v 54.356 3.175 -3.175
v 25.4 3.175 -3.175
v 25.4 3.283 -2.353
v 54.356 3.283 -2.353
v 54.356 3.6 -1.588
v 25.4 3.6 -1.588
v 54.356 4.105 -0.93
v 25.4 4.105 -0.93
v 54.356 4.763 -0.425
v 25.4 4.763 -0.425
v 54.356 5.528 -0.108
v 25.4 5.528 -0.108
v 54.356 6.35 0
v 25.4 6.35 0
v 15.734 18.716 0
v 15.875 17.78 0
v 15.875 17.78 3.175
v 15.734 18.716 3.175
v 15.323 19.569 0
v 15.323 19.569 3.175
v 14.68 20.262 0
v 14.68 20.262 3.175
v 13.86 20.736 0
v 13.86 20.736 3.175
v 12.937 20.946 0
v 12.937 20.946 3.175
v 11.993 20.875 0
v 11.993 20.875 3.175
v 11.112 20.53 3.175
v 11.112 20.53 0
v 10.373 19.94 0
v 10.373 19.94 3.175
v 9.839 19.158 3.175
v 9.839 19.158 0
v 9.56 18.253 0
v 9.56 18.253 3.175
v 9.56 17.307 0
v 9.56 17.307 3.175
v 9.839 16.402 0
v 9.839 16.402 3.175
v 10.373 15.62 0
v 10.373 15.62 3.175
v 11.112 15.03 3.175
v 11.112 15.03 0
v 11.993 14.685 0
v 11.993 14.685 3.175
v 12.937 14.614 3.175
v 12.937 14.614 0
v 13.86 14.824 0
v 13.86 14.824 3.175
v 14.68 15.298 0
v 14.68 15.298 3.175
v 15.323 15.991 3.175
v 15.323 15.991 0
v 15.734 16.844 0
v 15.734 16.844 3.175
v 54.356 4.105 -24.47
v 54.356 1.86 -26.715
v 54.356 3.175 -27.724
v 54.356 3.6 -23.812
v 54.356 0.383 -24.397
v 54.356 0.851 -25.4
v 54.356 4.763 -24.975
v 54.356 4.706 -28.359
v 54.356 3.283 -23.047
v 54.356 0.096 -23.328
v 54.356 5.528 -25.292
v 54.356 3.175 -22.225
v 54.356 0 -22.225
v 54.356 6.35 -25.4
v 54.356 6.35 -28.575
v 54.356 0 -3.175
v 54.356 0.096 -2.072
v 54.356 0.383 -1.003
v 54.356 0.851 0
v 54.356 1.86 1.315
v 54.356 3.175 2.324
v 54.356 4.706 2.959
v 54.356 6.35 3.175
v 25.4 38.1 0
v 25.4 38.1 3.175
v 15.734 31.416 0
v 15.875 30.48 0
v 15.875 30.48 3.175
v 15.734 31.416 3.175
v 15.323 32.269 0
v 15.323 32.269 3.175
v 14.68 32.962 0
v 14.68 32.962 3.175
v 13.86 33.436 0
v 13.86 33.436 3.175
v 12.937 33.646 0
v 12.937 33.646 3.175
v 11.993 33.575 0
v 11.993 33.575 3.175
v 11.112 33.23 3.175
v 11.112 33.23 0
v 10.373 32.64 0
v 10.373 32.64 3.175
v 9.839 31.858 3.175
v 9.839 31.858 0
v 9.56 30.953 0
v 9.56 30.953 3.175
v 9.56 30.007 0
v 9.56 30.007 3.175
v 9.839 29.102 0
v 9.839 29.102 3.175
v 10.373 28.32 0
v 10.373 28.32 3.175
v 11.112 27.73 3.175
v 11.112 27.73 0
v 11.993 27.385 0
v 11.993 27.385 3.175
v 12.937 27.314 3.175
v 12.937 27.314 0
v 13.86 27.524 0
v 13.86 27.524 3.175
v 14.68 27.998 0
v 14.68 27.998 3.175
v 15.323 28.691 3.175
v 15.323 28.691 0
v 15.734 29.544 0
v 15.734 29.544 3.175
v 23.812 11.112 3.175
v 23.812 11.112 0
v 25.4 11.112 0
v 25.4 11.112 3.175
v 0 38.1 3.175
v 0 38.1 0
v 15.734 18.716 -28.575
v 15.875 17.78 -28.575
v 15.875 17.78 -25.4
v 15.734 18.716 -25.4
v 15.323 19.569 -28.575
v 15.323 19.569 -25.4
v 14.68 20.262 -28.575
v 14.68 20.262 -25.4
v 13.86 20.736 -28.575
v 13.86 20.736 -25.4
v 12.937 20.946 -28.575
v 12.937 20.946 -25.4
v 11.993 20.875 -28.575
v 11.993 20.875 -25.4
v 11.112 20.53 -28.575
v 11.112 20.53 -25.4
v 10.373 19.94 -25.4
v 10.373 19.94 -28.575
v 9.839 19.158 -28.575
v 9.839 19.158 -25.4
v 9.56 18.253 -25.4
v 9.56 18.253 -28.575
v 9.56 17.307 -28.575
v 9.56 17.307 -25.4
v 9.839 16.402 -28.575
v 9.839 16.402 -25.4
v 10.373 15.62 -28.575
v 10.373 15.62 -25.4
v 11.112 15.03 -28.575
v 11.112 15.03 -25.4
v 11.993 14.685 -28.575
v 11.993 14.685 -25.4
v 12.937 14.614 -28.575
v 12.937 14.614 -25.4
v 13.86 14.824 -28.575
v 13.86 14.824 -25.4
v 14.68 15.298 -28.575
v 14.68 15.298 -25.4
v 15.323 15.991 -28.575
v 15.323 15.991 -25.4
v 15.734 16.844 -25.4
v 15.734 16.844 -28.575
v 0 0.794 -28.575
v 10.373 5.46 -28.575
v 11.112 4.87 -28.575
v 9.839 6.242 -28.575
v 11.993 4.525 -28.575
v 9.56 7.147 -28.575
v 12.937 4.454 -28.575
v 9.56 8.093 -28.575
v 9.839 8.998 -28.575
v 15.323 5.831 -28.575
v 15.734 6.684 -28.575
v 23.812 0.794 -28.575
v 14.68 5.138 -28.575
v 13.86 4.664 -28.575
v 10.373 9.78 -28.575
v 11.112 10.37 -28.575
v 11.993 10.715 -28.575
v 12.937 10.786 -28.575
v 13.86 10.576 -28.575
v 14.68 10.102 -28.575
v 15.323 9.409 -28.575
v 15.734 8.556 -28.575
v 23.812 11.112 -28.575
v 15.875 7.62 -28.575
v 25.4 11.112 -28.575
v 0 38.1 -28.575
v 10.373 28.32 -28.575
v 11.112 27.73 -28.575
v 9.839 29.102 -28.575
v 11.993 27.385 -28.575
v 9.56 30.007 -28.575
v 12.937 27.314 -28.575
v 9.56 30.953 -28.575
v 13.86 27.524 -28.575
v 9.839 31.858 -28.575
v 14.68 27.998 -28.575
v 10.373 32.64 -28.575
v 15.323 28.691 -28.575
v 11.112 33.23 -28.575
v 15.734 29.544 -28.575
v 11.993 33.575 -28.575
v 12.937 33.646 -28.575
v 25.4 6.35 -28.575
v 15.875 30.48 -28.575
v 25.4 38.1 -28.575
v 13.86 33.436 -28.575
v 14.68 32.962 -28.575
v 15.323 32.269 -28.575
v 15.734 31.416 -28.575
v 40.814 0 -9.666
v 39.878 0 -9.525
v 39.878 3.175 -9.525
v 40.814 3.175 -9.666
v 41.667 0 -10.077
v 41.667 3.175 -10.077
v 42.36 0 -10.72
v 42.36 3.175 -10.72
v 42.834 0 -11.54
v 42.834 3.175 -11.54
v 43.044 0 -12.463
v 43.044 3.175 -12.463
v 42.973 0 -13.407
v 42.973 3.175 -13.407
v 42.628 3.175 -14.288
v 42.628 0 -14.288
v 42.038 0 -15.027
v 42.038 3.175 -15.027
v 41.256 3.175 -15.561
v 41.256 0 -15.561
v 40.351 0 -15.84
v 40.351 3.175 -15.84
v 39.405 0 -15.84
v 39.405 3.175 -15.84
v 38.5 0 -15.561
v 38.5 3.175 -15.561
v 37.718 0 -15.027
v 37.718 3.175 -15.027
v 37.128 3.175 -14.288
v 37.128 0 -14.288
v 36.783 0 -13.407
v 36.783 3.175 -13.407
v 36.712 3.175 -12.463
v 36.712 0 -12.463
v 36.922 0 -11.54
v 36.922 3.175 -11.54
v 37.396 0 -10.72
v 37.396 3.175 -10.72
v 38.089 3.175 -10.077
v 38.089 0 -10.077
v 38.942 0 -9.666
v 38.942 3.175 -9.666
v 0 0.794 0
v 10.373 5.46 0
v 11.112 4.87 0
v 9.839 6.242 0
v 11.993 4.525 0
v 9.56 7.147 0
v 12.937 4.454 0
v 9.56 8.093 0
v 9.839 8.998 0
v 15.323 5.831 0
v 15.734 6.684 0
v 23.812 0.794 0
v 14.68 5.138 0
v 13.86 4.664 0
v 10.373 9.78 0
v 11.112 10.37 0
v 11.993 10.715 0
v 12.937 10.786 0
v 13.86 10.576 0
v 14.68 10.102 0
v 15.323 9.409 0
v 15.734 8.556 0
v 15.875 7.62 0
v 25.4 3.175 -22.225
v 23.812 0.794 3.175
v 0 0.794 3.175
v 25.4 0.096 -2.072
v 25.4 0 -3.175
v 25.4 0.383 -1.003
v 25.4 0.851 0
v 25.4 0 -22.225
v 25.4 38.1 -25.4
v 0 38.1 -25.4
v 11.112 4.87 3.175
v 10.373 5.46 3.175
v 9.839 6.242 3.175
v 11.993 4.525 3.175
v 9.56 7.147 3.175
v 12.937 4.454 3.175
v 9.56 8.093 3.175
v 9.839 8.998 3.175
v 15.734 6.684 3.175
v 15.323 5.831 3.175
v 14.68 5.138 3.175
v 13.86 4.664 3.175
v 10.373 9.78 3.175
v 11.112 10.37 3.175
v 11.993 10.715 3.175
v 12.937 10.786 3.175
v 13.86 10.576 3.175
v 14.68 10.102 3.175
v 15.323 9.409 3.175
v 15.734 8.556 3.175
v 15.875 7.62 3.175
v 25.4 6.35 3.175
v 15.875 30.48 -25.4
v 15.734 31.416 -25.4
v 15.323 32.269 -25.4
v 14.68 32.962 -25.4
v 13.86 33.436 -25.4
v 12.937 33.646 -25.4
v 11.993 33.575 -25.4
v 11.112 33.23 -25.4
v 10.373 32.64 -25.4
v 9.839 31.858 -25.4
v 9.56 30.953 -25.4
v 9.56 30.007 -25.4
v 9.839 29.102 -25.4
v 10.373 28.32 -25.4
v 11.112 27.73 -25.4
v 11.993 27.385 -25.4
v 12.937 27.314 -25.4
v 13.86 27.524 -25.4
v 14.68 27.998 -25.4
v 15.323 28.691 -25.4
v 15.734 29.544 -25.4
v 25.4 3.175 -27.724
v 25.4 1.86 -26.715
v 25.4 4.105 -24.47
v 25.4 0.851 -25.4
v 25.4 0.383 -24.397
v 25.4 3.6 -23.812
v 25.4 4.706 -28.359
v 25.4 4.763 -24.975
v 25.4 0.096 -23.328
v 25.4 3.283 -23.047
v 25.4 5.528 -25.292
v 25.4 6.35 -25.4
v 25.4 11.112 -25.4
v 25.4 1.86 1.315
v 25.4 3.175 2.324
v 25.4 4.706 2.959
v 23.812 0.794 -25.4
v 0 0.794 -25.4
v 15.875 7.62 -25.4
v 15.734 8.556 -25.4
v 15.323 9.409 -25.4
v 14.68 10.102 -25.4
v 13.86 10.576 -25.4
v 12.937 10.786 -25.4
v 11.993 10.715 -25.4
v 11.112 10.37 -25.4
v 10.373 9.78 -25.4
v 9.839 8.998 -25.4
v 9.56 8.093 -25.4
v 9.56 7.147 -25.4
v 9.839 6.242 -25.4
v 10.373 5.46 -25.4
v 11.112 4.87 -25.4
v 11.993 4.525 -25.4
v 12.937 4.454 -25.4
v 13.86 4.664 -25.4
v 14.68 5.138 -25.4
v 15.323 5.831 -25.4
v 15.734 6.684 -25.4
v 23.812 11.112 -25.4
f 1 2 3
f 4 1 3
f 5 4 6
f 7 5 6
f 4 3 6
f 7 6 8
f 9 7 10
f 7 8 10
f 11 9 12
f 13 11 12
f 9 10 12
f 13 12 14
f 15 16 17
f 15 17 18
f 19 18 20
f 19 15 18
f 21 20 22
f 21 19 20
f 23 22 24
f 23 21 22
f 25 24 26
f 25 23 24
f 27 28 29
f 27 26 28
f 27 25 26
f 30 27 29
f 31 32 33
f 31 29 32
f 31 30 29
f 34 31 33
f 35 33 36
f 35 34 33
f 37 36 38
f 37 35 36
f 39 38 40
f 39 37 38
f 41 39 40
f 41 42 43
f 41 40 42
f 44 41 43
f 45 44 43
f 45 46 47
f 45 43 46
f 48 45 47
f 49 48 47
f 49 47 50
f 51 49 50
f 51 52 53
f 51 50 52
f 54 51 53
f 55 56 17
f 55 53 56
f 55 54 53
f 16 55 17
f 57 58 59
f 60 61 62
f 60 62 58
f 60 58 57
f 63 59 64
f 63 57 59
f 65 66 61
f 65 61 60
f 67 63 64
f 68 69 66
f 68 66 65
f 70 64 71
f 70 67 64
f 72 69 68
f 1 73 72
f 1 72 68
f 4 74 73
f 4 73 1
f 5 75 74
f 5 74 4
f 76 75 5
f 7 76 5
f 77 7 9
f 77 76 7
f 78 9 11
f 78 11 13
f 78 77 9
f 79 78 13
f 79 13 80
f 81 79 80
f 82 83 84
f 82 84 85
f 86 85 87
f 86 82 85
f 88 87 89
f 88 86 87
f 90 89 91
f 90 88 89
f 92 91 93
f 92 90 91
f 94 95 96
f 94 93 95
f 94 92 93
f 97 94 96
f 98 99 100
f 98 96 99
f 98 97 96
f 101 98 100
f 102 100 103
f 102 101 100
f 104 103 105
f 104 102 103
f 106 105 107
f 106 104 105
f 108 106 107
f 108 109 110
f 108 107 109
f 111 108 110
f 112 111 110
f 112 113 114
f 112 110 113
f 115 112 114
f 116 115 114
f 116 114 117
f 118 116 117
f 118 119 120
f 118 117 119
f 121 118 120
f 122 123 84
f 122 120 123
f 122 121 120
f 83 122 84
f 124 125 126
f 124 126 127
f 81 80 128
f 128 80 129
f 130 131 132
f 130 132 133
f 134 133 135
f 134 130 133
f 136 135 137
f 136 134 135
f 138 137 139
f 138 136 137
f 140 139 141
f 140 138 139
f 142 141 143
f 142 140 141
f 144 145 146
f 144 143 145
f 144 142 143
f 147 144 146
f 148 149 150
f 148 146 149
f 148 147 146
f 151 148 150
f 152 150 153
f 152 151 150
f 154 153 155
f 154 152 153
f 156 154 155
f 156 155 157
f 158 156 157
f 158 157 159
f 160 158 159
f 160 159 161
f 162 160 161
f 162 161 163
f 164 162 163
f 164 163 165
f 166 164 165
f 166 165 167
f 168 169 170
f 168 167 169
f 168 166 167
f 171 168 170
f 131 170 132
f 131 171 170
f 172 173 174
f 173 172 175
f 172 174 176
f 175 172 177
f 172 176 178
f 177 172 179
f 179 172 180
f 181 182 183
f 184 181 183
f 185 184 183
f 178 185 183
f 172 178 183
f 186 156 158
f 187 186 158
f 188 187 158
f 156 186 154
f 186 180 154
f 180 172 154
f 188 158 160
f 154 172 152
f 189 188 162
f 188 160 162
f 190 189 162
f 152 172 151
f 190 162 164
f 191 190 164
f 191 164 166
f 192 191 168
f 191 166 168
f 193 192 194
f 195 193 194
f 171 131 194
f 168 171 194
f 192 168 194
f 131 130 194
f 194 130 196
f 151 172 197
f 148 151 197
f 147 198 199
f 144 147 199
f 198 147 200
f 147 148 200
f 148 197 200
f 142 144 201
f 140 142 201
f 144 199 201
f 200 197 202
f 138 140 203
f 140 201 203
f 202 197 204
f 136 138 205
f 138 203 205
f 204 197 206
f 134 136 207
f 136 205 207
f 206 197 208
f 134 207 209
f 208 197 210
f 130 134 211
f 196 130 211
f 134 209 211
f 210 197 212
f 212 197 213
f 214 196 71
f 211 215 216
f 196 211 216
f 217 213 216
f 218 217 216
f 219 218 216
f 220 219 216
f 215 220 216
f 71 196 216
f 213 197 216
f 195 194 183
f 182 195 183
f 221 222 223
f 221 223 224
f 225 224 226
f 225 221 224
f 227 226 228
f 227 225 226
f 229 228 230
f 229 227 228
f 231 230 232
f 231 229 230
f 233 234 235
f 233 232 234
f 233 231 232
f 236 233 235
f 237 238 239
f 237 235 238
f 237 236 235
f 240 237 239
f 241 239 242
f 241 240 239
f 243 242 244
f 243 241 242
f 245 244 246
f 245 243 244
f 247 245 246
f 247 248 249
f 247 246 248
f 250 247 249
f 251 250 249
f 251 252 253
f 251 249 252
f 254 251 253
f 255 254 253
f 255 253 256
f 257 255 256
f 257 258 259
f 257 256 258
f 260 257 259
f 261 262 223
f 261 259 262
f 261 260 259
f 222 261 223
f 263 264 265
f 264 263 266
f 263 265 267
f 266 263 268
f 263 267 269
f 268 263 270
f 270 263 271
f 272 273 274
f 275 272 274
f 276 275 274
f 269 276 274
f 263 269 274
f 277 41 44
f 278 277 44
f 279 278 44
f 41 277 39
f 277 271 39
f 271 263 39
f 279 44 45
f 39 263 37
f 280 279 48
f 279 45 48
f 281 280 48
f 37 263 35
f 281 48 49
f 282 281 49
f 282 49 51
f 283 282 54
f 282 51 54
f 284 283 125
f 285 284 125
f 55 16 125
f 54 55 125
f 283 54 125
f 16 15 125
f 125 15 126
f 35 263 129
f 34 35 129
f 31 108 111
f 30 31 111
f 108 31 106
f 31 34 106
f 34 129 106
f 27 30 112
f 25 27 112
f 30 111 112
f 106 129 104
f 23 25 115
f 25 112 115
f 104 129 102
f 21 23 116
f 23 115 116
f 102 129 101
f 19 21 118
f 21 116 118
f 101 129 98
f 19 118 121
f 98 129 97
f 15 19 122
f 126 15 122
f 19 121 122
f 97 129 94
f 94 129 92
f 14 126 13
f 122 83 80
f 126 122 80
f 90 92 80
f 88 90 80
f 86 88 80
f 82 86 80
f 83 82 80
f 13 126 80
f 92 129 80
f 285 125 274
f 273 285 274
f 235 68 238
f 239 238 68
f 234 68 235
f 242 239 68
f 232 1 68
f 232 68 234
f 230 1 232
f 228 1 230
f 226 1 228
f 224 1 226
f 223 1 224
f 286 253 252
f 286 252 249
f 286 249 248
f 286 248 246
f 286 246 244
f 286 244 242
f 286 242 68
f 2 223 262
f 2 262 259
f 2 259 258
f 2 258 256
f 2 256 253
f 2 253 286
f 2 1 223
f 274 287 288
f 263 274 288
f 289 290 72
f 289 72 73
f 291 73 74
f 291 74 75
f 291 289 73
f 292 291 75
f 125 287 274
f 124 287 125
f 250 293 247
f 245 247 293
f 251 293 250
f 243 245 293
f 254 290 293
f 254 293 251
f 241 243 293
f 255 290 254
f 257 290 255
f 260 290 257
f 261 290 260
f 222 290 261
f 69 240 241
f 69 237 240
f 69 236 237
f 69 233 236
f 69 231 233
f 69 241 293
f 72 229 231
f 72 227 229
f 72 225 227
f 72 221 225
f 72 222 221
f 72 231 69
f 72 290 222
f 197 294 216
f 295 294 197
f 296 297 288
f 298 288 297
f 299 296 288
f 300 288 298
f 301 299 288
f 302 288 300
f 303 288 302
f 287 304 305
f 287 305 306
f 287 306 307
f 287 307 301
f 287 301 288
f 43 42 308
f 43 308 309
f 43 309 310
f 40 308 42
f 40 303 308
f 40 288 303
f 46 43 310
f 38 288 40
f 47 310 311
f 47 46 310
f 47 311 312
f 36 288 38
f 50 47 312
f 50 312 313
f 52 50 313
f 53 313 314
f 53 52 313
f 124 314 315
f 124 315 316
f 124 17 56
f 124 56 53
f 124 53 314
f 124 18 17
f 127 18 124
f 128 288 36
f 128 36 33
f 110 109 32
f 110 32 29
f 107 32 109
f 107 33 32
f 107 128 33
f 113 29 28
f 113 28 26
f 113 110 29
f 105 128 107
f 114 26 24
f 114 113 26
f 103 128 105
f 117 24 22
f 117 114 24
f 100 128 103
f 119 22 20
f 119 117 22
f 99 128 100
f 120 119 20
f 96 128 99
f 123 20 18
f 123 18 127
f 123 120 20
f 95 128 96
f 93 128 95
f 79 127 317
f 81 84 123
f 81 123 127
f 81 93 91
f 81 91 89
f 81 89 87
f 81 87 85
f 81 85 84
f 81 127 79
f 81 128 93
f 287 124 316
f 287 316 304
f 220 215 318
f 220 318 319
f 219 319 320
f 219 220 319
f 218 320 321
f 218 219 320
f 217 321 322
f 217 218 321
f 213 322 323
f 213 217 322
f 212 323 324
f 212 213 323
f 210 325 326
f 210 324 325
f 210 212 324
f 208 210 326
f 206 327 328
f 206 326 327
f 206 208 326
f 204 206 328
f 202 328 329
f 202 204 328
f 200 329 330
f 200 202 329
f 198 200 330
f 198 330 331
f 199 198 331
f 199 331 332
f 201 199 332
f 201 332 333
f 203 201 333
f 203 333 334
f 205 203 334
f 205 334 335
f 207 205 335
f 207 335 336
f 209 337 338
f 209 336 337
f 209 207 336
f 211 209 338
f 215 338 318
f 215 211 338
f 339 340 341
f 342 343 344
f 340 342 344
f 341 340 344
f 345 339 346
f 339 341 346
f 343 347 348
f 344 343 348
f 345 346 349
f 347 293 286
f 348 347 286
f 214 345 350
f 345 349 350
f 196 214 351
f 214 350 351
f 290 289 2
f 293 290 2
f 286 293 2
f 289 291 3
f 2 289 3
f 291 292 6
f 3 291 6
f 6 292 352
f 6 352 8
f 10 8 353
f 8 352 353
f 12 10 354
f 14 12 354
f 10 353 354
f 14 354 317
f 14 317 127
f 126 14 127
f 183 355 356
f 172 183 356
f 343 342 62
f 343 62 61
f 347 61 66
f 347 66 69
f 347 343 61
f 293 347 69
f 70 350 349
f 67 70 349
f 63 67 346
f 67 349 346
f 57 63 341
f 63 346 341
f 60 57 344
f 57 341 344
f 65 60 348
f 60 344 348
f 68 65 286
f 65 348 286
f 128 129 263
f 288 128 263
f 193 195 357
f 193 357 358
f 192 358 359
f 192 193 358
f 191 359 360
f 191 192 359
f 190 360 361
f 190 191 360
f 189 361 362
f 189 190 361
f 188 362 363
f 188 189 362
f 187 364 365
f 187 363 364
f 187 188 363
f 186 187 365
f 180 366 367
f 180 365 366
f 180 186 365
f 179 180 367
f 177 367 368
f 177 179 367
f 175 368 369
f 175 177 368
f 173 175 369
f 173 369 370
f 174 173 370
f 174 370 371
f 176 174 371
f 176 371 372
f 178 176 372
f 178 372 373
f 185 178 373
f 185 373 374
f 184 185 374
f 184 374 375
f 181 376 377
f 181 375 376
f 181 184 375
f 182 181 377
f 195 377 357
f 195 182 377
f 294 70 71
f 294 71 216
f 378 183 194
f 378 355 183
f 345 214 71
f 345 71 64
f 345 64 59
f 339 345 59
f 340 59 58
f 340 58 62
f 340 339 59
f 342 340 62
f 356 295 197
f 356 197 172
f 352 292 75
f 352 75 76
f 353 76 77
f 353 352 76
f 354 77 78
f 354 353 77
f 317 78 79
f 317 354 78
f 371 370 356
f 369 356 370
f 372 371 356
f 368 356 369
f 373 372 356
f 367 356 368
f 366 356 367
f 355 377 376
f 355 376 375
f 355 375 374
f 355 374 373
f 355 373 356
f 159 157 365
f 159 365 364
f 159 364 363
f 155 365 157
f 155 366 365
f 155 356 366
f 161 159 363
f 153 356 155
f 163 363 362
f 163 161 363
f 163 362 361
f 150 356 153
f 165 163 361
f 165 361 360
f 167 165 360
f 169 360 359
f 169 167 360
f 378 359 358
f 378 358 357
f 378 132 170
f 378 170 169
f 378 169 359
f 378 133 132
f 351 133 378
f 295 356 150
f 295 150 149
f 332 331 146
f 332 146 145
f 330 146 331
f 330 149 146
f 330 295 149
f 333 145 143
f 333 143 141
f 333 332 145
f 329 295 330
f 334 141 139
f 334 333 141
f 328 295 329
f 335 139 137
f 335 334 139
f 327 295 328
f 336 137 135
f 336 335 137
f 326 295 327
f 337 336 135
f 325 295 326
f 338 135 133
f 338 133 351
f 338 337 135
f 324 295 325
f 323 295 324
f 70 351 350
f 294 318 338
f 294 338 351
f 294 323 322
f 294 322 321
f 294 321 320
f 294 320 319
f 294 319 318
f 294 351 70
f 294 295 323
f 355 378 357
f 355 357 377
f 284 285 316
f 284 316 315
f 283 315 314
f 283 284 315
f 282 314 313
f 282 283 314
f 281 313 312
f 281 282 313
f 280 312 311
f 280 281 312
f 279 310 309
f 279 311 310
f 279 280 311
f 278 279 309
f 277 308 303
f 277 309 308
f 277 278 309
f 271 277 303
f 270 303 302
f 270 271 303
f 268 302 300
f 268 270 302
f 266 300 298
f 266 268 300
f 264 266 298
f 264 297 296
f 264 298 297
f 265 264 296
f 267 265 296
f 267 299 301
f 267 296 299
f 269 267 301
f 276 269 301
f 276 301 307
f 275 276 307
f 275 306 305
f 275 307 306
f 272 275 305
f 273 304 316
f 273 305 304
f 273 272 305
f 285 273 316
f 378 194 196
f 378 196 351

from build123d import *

# Parameters (mm, degrees)
BOSS_EXTRUDE1_DEPTH     = 3.175
SKETCH2_W               = 28.956
SKETCH2_H               = 3.175
BOSS_EXTRUDE2_DEPTH     = 25.4
CUT_EXTRUDE1_DEPTH      = 74.581568589
CUT_EXTRUDE1_DEPTH_BACK = 74.581568589
SKETCH3_R               = 3.175
CUT_EXTRUDE2_DEPTH      = 71.646025975
CUT_EXTRUDE2_DEPTH_BACK = 71.646025975
SKETCH6_R               = 3.175
CUT_EXTRUDE3_DEPTH      = 74.581568589
CUT_EXTRUDE3_DEPTH_BACK = 74.581568589
SKETCH7_W               = 25.4
SKETCH7_H               = 0.79375
CONVERT_SOLID1_START    = 23.8125
CONVERT_SOLID1_DEPTH    = 30.5435
CONVERT_SOLID1_2_DEPTH  = 1.5875
CONVERT_SOLID1_START_2  = 25.4
CONVERT_SOLID1_3_DEPTH  = 28.956


# Read off the part's stored shape, not the designer's step: Convert-Solid1
with BuildPart() as part:
    # Sketch1 → Boss-Extrude1 (new body)
    with BuildSketch(Plane.XY):
        Polygon((54.356, 6.35), (25.4, 38.1), (0, 38.1), (0, 0), (54.356, 0), align=None)
    boss_extrude1 = extrude(amount=BOSS_EXTRUDE1_DEPTH)

    # Sketch2 → Boss-Extrude2 (add)
    with BuildSketch(Plane(origin=(0, 0, 0), x_dir=(-1, 0, 0), z_dir=(0, 0, -1))):
        with Locations((-39.878, 1.5875)):
            Rectangle(SKETCH2_W, SKETCH2_H)
    extrude(amount=BOSS_EXTRUDE2_DEPTH)

    # Mirror1: Boss-Extrude1 across plane
    add(boss_extrude1.mirror(Plane.XY.offset(-12.7)))

    # Sketch3 → Cut-Extrude1 (cut, two sides: drawn at the far end of the back side and taken through both)
    with BuildSketch(Plane.XY.offset(3.175).offset(-CUT_EXTRUDE1_DEPTH_BACK)):
        with Locations((12.7, 7.62)):
            Circle(SKETCH3_R)
        with Locations((12.7, 17.78)):
            Circle(SKETCH3_R)
        with Locations((12.7, 30.48)):
            Circle(SKETCH3_R)
    extrude(amount=CUT_EXTRUDE1_DEPTH + CUT_EXTRUDE1_DEPTH_BACK, mode=Mode.SUBTRACT)

    # Sketch6 → Cut-Extrude2 (cut, two sides: drawn at the far end of the back side and taken through both)
    with BuildSketch(Plane(origin=(0, 3.175, 0), x_dir=(1, 0, 0), z_dir=(0, 1, 0)).offset(-CUT_EXTRUDE2_DEPTH_BACK)):
        with Locations(Location((39.878, 12.7, 0), (0, 0, 270))):
            Circle(SKETCH6_R)
    extrude(amount=CUT_EXTRUDE2_DEPTH + CUT_EXTRUDE2_DEPTH_BACK, mode=Mode.SUBTRACT)

    # Sketch7 → Cut-Extrude3 (cut, two sides: drawn at the far end of the back side and taken through both)
    with BuildSketch(Plane(origin=(0, 0, -28.575), x_dir=(-1, 0, 0), z_dir=(0, 0, -1)).offset(-CUT_EXTRUDE3_DEPTH_BACK)):
        with Locations((-12.7, 0.396875)):
            Rectangle(SKETCH7_W, SKETCH7_H)
    extrude(amount=CUT_EXTRUDE3_DEPTH + CUT_EXTRUDE3_DEPTH_BACK, mode=Mode.SUBTRACT)

    # Convert-Solid1 outline → Convert-Solid1 (cut)
    with BuildSketch(Plane.YZ.offset(CONVERT_SOLID1_START)):
        with BuildLine():
            Line((0, -28.575), (6.35, -28.575))
            ThreePointArc((6.35, -28.575), (3.174999999, -27.724261314), (0.850738685, -25.4))
            ThreePointArc((0.850738685, -25.4), (0.216371003, -23.868500936), (0, -22.225))
            Line((0, -22.225), (0, -28.575))
        make_face()
        with BuildLine():
            Line((0, 3.175), (0, -3.175))
            ThreePointArc((0, -3.175), (0.216371003, -1.531499064), (0.850738685, 0))
            ThreePointArc((0.850738685, 0), (3.174999999, 2.324261314), (6.35, 3.175))
            Line((6.35, 3.175), (0, 3.175))
        make_face()
    extrude(amount=CONVERT_SOLID1_DEPTH, mode=Mode.SUBTRACT)

    # Convert-Solid1 2 outline → Convert-Solid1 2 (cut)
    with BuildSketch(Plane.YZ.offset(CONVERT_SOLID1_START)):
        with BuildLine():
            Line((6.35, -28.575), (11.1125, -28.575))
            Line((11.1125, -28.575), (11.1125, -25.4))
            Line((11.1125, -25.4), (0.850738685, -25.4))
            ThreePointArc((0.850738685, -25.4), (3.174999999, -27.724261314), (6.35, -28.575))
        make_face()
        with BuildLine():
            Line((0.850738685, 0), (11.1125, 0))
            Line((11.1125, 0), (11.1125, 3.175))
            Line((11.1125, 3.175), (6.35, 3.175))
            ThreePointArc((6.35, 3.175), (3.174999999, 2.324261314), (0.850738685, 0))
        make_face()
    extrude(amount=CONVERT_SOLID1_2_DEPTH, mode=Mode.SUBTRACT)

    # Convert-Solid1 3 outline → Convert-Solid1 3 (add)
    with BuildSketch(Plane.YZ.offset(CONVERT_SOLID1_START_2)):
        with BuildLine():
            Line((3.175, -25.4), (6.35, -25.4))
            ThreePointArc((6.35, -25.4), (4.10493597, -24.47006403), (3.175, -22.225))
            Line((3.175, -22.225), (3.175, -25.4))
        make_face()
        with BuildLine():
            Line((3.175, 0), (3.175, -3.175))
            ThreePointArc((3.175, -3.175), (4.10493597, -0.92993597), (6.35, 0))
            Line((6.35, 0), (3.175, 0))
        make_face()
    extrude(amount=CONVERT_SOLID1_3_DEPTH)


solid = part.part
